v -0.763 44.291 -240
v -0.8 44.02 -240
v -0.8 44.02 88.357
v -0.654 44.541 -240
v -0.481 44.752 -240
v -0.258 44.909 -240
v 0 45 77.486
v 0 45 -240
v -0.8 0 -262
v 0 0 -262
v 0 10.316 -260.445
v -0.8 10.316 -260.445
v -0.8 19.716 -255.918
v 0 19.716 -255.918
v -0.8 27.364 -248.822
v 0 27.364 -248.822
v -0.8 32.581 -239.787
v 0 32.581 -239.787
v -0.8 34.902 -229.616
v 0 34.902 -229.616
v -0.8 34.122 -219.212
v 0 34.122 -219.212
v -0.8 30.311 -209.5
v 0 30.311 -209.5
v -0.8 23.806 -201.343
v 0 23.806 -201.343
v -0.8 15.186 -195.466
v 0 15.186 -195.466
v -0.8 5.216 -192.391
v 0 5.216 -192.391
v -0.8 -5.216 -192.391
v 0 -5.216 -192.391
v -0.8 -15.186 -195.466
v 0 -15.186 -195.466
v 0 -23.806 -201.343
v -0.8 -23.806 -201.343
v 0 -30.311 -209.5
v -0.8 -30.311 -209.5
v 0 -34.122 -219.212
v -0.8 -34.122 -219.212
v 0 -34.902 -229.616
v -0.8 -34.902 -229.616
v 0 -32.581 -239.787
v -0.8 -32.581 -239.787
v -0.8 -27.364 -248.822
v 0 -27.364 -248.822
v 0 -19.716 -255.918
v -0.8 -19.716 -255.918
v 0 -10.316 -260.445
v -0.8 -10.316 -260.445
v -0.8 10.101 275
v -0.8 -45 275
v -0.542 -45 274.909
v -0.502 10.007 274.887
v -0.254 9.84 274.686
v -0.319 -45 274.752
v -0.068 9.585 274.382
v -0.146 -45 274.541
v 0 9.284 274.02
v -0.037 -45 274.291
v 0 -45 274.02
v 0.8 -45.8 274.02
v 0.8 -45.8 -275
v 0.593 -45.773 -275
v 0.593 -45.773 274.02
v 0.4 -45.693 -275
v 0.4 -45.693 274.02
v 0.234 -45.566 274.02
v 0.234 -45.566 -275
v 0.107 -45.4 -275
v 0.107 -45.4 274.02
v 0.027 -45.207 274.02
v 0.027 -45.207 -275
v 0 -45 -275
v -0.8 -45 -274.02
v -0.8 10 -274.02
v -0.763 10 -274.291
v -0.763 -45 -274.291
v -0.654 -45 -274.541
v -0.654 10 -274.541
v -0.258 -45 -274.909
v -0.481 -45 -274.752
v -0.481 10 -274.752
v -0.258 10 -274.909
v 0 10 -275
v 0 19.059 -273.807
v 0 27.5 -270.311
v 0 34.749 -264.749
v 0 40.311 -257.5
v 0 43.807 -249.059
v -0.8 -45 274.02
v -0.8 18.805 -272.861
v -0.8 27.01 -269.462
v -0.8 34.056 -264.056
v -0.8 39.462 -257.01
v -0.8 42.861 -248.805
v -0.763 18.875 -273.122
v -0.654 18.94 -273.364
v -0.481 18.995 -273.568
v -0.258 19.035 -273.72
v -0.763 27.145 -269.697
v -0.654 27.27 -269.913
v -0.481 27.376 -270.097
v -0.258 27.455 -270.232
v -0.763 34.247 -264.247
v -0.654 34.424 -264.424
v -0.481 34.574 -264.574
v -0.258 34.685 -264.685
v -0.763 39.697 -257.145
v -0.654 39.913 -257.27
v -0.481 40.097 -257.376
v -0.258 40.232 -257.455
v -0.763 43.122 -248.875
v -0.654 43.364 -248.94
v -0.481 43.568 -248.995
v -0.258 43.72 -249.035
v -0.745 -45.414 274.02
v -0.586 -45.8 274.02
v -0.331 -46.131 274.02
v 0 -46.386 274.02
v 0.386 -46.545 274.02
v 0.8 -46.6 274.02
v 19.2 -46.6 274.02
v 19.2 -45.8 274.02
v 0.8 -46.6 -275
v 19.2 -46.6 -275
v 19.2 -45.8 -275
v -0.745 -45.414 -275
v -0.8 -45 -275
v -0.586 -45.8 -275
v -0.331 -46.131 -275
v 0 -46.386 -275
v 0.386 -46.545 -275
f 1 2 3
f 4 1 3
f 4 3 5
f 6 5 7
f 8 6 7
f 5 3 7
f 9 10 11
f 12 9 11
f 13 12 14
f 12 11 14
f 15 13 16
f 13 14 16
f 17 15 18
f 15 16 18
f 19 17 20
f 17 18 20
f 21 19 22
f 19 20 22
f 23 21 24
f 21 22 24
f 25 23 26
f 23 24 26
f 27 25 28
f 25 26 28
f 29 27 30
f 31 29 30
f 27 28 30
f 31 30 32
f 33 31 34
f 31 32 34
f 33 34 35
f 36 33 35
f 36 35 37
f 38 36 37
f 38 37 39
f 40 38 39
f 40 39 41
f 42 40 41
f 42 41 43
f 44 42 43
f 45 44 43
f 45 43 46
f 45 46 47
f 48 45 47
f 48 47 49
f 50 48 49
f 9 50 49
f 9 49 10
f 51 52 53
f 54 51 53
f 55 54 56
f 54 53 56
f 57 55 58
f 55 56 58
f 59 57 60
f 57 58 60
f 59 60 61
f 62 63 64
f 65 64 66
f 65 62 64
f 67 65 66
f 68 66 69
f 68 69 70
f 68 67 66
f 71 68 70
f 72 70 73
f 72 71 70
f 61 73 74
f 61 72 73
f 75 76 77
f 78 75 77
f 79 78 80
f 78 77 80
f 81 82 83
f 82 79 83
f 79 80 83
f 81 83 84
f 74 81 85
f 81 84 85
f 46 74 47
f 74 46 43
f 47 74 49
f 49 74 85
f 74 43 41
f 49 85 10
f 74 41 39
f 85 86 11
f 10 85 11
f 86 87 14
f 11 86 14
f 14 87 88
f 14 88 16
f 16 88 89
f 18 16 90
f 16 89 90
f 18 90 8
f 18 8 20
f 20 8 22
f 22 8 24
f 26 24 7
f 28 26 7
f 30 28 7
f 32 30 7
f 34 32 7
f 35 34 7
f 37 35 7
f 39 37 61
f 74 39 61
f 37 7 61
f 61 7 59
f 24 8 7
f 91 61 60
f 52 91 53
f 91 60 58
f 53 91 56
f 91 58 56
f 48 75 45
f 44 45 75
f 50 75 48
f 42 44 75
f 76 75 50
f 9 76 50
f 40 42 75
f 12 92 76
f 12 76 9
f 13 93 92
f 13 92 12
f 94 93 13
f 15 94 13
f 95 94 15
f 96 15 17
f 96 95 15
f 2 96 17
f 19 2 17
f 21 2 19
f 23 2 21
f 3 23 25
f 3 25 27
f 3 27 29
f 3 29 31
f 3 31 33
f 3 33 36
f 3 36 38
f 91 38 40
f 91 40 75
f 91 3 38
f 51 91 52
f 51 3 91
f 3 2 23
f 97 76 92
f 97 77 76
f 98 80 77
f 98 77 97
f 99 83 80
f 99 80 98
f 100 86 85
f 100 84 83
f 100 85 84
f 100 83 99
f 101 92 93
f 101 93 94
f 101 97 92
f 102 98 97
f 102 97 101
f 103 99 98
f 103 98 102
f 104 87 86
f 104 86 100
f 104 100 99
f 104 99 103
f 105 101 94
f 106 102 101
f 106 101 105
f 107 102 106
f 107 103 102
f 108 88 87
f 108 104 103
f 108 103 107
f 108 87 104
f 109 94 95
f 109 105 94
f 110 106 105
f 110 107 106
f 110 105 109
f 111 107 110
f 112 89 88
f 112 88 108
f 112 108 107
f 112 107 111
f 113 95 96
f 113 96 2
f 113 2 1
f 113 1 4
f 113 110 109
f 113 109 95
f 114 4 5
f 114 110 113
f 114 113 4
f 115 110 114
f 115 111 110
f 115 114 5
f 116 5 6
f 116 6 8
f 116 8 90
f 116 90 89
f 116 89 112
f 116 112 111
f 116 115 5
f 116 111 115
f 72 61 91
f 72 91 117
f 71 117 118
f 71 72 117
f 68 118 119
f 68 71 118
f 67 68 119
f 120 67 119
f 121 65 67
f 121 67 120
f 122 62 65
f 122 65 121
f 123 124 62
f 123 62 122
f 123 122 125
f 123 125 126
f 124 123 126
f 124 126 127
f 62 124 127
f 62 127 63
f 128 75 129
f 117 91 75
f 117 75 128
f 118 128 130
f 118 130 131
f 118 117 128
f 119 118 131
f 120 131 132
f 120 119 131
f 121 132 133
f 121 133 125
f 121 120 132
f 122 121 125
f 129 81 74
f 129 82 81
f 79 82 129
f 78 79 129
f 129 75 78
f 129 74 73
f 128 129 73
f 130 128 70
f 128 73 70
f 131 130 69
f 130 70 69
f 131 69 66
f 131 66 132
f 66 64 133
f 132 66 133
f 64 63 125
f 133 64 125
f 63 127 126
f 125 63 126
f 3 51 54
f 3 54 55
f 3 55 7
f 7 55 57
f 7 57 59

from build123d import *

# Parameters (mm, degrees)
BASE_FLANGE1_DEPTH = 0.8
SKETCH6_R          = 35.00000000000004
CUT_EXTRUDE1_DEPTH = 10
CUT_EXTRUDE2_DEPTH = 10
FILLET1_R          = 1
FILLET2_R          = 1
FILLET5_R          = 1
EDGE_FLANGE1_DEPTH = 549.0202041028867


# Sheet-metal steps are written as plain solids
with BuildPart() as part:
    # Base-Flange1: sheet metal written as solids
    # Sketch1 → Base-Flange1 (new body)
    with BuildSketch(Plane(origin=(0, 0, 0), x_dir=(0, 0, -1), z_dir=(1, 0, 0))):
        Polygon((-275.00000000000006, 10.101383653592132), (-82.96531829613122, 44.999999999999964), (274.99999999999994, 45.00000000000006), (274.99999999999994, -44.99999999999994), (-275.00000000000006, -45), align=None)
    extrude(amount=-BASE_FLANGE1_DEPTH)

    # Sketch6 → Cut-Extrude1 (cut)
    with BuildSketch(Plane(origin=(0, 0, 0), x_dir=(0, 0, -1), z_dir=(1, 0, 0))):
        with Locations((226.99999999999997, 0)):
            Circle(SKETCH6_R)
    extrude(amount=-CUT_EXTRUDE1_DEPTH, mode=Mode.SUBTRACT)

    # Sketch7 → Cut-Extrude2 (cut)
    with BuildSketch(Plane(origin=(0, 0, 0), x_dir=(0, 0, -1), z_dir=(1, 0, 0))):
        with BuildLine():
            Line((274.99999999999994, 45.00000000000006), (239.99999999999997, 45.00000000000006))
            ThreePointArc((239.99999999999997, 45.00000000000006), (264.74873734152914, 34.74873734152919), (274.99999999999994, 10.00000000000005))
            Line((274.99999999999994, 10.00000000000005), (274.99999999999994, 45.00000000000006))
        make_face()
    extrude(amount=-CUT_EXTRUDE2_DEPTH, mode=Mode.SUBTRACT)

    # Fillet1
    # the kernel refuses this fillet: 1 mm, written as the material it takes off along each edge
    with BuildSketch(Plane(origin=(0, 9.663409461677158, 277.4100163084993), x_dir=(-1.0, -1.5331256382814002e-12, -2.7861614884612947e-13), z_dir=(0, 0.1788022151163431, -0.9838850379335429))) as fillet1_piece_1:
        with BuildLine():
            CenterArc((1.0000000000015268, -0.979795897113006), FILLET1_R, 101.53695903288988, 78.46304096719939)
            Line((1.52675e-12, -0.9797958971145642), (-0.01999999999847325, -0.9797958971145954))
            Line((-0.01999999999847325, -0.9797958971145954), (-0.02, -3.816e-14))
            Line((-0.02, -3.816e-14), (-3.116e-14, 0.01999999999999651))
            ThreePointArc((-3.116e-14, 0.01999999999999651), (0.4000000000000967, 0.0200000000006233), (0.7960000000002303, 0.01959591794225489))
            Line((0.7960000000002303, 0.01959591794225489), (0.8000000000002557, 0))
        make_face()
    extrude(amount=204.97795897114563, mode=Mode.SUBTRACT)

    # Fillet2
    # the kernel refuses this fillet: 1 mm, written as the material it takes off along each edge
    with BuildSketch(Plane(origin=(-0.8, 10.00000000000005, -274.99999999999994), x_dir=(0, 0, 1), z_dir=(0, -1, 0))) as fillet2_piece_1:
        with BuildLine():
            CenterArc((0.9797958971145704, -1), FILLET2_R, 90, 78.46304096719936)
            Line((1.25056e-12, -0.8000000000002546), (-0.01959591794098969, -0.7960000000002597))
            ThreePointArc((-0.01959591794098969, -0.7960000000002597), (-0.01999999999998181, -0.4000000000001273), (-0.01999999999998181, 0))
            Line((-0.01999999999998181, 0), (0, 0.02000000000000002))
            Line((0, 0.02000000000000002), (0.9797958971145704, 0.02000000000000002))
            Line((0.9797958971145704, 0.02000000000000002), (0.9797958971145704, 0))
        make_face()
    extrude(amount=57.44948974278642, mode=Mode.SUBTRACT)
    with BuildSketch(Plane(origin=(-0.8, 10.000000000000078, -239.99999999999997), x_dir=(0, -1.07e-15, -1), z_dir=(0, -1, 1.07e-15))) as fillet2_piece_2:
        with BuildLine():
            CenterArc((34.0202041028854, 1), FILLET2_R, 270, 78.46304096719928)
            Line((34.99999999999872, 0.800000000000253), (35.01959591794102, 0.7960000000002581))
            ThreePointArc((35.01959591794102, 0.7960000000002581), (35.01999999999995, 0.4000000000001265), (35.01999999999995, 0))
            Line((35.01999999999995, 0), (34.999999999999915, -0.02000000000000002))
            Line((34.999999999999915, -0.02000000000000002), (34.0202041028854, -0.02000000000000002))
            Line((34.0202041028854, -0.02000000000000002), (34.0202041028854, 0))
        make_face()
    revolve(axis=Axis((-0.8, 10.000000000000078, -239.99999999999997), (1, 0, 0)), revolution_arc=90.00000000000006, mode=Mode.SUBTRACT)
    with BuildSketch(Plane(origin=(-0.8, 44.999999999999964, 90.3137875244906), x_dir=(0, -1, -2.6e-16), z_dir=(0, 2.6e-16, -1))) as fillet2_piece_3:
        with BuildLine():
            CenterArc((0.9797958971145846, -1), FILLET2_R, 90, 78.46304096719959)
            Line((1.25766e-12, -0.8000000000002574), (-0.01959591794101101, -0.7960000000002625))
            ThreePointArc((-0.01959591794101101, -0.7960000000002625), (-0.02000000000000313, -0.4000000000001287), (-0.02000000000000313, 0))
            Line((-0.02000000000000313, 0), (0, 0.02000000000000002))
            Line((0, 0.02000000000000002), (0.9797958971145846, 0.02000000000000002))
            Line((0.9797958971145846, 0.02000000000000002), (0.9797958971145846, 0))
        make_face()
    extrude(amount=330.3137875244905, mode=Mode.SUBTRACT)

    # Fillet5
    # the kernel refuses this fillet: 1 mm, written as the material it takes off along each edge
    with BuildSketch(Plane(origin=(0, -47.449489742786426, 275.00000000000006), x_dir=(-1.0, 0, -1.5631940186717228e-12), z_dir=(0, 1, 0))) as fillet5_piece_1:
        with BuildLine():
            CenterArc((1.0000000000015317, -0.9797958971130072), FILLET5_R, 101.53695903289021, 78.46304096719933)
            Line((1.53161e-12, -0.9797958971145704), (0, 0))
            Line((0, 0), (0.8000000000002546, 0))
        make_face()
    extrude(amount=59.00451925564195, mode=Mode.SUBTRACT)

    # Edge-Flange1: sheet metal written as solids
    # Edge-Flange1 section (on a plane across the edge) → Edge-Flange1 (add)
    with BuildSketch(Plane(origin=(-5.59e-15, -45.800000000000004, 274.0202041028868), x_dir=(3.49e-15, 1, 1e-16), z_dir=(0, 1e-16, -1))):
        with BuildLine():
            Line((-0.8, 0.8000000000000028), (-0.8, 19.200000000000003))
            Line((-0.8, 19.200000000000003), (0, 19.200000000000003))
            Line((0, 19.200000000000003), (0, 0.8000000000000028))
            ThreePointArc((0, 0.8000000000000028), (0.23431457505076303, 0.2343145750507638), (0.8000000000000028, 2.78e-15))
            Line((0.8000000000000028, 2.78e-15), (0.8000000000000056, -0.7999999999999973))
            ThreePointArc((0.8000000000000056, -0.7999999999999973), (-0.331370849898474, -0.3313708498984752), (-0.8, 0.8000000000000028))
        make_face()
    extrude(amount=EDGE_FLANGE1_DEPTH)


solid = part.part
